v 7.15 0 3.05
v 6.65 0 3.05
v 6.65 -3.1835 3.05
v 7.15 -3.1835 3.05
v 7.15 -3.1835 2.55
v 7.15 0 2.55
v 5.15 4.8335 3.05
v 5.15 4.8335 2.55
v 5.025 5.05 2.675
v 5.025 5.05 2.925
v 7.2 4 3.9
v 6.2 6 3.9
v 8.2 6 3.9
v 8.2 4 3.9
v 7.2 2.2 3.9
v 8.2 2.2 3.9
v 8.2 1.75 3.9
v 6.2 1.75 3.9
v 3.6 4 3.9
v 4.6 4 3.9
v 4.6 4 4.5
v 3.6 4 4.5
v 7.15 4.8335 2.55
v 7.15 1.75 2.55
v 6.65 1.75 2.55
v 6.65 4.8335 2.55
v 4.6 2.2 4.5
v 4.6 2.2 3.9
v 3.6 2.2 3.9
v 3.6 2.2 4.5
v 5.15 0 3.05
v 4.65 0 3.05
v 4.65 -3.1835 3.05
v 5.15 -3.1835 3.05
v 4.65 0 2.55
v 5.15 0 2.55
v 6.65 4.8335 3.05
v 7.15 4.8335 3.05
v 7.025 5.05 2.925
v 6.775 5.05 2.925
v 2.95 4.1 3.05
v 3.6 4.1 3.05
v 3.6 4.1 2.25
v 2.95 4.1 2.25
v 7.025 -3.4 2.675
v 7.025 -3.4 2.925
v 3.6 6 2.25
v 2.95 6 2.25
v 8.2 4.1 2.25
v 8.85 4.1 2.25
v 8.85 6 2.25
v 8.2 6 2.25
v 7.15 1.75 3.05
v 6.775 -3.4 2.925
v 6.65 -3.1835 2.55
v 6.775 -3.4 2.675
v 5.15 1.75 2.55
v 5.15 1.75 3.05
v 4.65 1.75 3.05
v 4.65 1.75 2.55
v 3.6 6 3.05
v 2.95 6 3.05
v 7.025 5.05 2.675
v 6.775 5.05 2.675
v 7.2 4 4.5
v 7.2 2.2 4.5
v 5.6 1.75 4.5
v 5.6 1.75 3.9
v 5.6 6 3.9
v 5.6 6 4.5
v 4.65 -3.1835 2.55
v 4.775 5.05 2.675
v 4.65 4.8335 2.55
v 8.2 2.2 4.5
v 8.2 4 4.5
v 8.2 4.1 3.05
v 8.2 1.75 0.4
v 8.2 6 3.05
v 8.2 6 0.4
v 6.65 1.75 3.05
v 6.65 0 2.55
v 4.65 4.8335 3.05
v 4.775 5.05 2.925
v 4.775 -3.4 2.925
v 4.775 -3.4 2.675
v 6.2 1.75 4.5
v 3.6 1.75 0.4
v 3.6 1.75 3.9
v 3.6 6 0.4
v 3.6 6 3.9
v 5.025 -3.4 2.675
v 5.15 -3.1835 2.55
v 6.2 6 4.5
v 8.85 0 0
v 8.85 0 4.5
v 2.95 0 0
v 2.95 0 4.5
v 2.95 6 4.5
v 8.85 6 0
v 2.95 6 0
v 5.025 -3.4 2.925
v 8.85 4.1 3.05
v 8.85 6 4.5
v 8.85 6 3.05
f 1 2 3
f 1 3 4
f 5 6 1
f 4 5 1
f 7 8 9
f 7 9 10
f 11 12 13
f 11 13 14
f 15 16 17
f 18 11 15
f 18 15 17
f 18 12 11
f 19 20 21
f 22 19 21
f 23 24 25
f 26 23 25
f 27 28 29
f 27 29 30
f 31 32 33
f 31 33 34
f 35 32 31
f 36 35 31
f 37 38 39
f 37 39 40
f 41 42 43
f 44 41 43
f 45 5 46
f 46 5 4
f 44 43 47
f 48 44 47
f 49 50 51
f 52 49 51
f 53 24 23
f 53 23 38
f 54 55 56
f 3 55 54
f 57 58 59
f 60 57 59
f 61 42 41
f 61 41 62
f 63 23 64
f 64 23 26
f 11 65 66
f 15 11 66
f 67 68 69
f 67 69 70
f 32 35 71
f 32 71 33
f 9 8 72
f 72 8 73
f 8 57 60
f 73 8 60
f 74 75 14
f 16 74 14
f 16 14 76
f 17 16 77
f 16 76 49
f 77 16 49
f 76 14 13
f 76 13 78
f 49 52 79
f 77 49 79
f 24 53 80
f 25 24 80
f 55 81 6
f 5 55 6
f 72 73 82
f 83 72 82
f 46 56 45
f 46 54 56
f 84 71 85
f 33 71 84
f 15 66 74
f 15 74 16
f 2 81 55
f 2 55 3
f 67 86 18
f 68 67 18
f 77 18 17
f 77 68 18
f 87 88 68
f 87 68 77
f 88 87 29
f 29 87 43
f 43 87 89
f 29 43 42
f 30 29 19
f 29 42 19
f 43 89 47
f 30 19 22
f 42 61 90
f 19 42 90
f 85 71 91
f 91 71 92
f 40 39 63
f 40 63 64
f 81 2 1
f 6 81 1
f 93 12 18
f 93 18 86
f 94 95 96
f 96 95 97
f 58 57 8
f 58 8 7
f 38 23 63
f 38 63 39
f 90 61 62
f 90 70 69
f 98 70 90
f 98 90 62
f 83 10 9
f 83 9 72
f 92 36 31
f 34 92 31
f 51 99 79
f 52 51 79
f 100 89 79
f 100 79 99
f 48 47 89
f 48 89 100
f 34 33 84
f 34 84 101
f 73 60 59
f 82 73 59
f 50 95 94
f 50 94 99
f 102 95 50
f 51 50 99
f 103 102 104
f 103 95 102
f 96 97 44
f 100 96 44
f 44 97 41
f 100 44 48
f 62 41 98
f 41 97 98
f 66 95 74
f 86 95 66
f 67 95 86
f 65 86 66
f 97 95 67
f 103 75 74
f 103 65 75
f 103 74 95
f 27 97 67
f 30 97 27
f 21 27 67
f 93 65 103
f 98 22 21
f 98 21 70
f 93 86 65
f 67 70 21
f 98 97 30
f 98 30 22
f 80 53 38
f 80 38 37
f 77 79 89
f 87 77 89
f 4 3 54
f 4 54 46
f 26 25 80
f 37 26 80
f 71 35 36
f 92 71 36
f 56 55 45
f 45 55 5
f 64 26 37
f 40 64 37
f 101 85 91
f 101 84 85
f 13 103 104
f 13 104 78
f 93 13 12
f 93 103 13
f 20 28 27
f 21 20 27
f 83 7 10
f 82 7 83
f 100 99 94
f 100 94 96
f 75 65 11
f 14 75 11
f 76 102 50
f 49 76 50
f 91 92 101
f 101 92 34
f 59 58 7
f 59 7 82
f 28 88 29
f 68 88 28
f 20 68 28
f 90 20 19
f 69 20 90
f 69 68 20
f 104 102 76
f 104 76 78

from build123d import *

# Parameters (mm, degrees)
SKETCH1_W            = 6
SKETCH1_H            = 4.1
BOSS_EXTRUDE1_DEPTH  = 2.6
SKETCH2_W            = 2.6
SKETCH2_H            = 3.5
CUT_EXTRUDE1_DEPTH   = 4.25
SKETCH3_W            = 0.6
SKETCH3_H            = 4.25
CUT_EXTRUDE2_DEPTH   = 1.6
SKETCH4_W            = 1
SKETCH4_H            = 0.6
BOSS_EXTRUDE2_DEPTH  = 4.25
BOSS_EXTRUDE3_DEPTH  = 1
SKETCH6_W            = 0.6
SKETCH6_H            = 2
BOSS_EXTRUDE4_DEPTH  = 1
SKETCH7_W            = 4.1
SKETCH7_H            = 6
BOSS_EXTRUDE5_DEPTH  = 0.65
SKETCH8_W            = 0.6
SKETCH8_H            = 2
BOSS_EXTRUDE6_DEPTH  = 1
BOSS_EXTRUDE7_DEPTH  = 1
SKETCH10_W           = 4.1
SKETCH10_H           = 6
BOSS_EXTRUDE8_DEPTH  = 0.65
SKETCH11_W           = 5.9
SKETCH11_H           = 6
BOSS_EXTRUDE9_DEPTH  = 0.4
SKETCH12_W           = 0.8
SKETCH12_H           = 1.9
CUT_EXTRUDE3_DEPTH   = 1.65
SKETCH13_W           = 0.8
SKETCH13_H           = 1.9
CUT_EXTRUDE4_DEPTH   = 6.9
SKETCH14_W           = 0.5
SKETCH14_H           = 0.5
BOSS_EXTRUDE10_DEPTH = 3.3
SKETCH15_W           = 0.5
SKETCH15_H           = 0.5
BOSS_EXTRUDE11_DEPTH = 3.3
SKETCH16_W           = 0.5
SKETCH16_H           = 0.5
BOSS_EXTRUDE12_DEPTH = 3.4
SKETCH17_W           = 0.5
SKETCH17_H           = 0.5
BOSS_EXTRUDE13_DEPTH = 3.4
CHAMFER1_SIZE        = 0.125
CHAMFER1_SIZE2       = 0.216506351
CHAMFER2_SIZE        = 0.125
CHAMFER2_SIZE2       = 0.216506351
CHAMFER3_SIZE        = 0.125
CHAMFER3_SIZE2       = 0.216506351
CHAMFER4_SIZE        = 0.125
CHAMFER4_SIZE2       = 0.216506351


with BuildPart() as part:
    # Sketch1 → Boss-Extrude1 (new body)
    with BuildSketch(Plane(origin=(4.6, 0, 0), x_dir=(0, -1, 0), z_dir=(-1, 0, 0))):
        with Locations((-3, 2.45)):
            Rectangle(SKETCH1_W, SKETCH1_H)
    extrude(amount=-BOSS_EXTRUDE1_DEPTH)

    # Sketch2 → Cut-Extrude1 (cut)
    with BuildSketch(Plane(origin=(0, 6, 0), x_dir=(-1, 0, 0), z_dir=(0, 1, 0))):
        with Locations((-5.9, 2.15)):
            Rectangle(SKETCH2_W, SKETCH2_H)
    extrude(amount=-CUT_EXTRUDE1_DEPTH, mode=Mode.SUBTRACT)

    # Sketch3 → Cut-Extrude2 (cut)
    with BuildSketch(Plane.ZY.offset(-4.6)):
        with Locations((4.2, 3.875)):
            Rectangle(SKETCH3_W, SKETCH3_H)
    extrude(amount=-CUT_EXTRUDE2_DEPTH, mode=Mode.SUBTRACT)

    # Sketch4 → Boss-Extrude2 (add)
    with BuildSketch(Plane(origin=(0, 1.75, 0), x_dir=(-1, 0, 0), z_dir=(0, 1, 0))):
        with Locations((-5.1, 4.2)):
            Rectangle(SKETCH4_W, SKETCH4_H)
    extrude(amount=BOSS_EXTRUDE2_DEPTH)

    # Sketch5 → Boss-Extrude3 (add)
    with BuildSketch(Plane.ZY.offset(-4.6)):
        Polygon((0.4, 0), (0.4, 1.75), (3.9, 1.75), (3.9, 2.2), (4.5, 2.2), (4.5, 0), align=None)
    extrude(amount=BOSS_EXTRUDE3_DEPTH)

    # Sketch6 → Boss-Extrude4 (add)
    with BuildSketch(Plane.ZY.offset(-4.6)):
        with Locations((4.2, 5)):
            Rectangle(SKETCH6_W, SKETCH6_H)
    extrude(amount=BOSS_EXTRUDE4_DEPTH)

    # Sketch7 → Boss-Extrude5 (add)
    with BuildSketch(Plane.ZY.offset(-3.6)):
        with Locations((2.45, 3)):
            Rectangle(SKETCH7_W, SKETCH7_H)
    extrude(amount=BOSS_EXTRUDE5_DEPTH)

    # Sketch8 → Boss-Extrude6 (add)
    with BuildSketch(Plane(origin=(7.2, 0, 0), x_dir=(0, 0, -1), z_dir=(1, 0, 0))):
        with Locations((-4.2, 5)):
            Rectangle(SKETCH8_W, SKETCH8_H)
    extrude(amount=BOSS_EXTRUDE6_DEPTH)

    # Sketch9 → Boss-Extrude7 (add)
    with BuildSketch(Plane(origin=(7.2, 0, 0), x_dir=(0, 0, -1), z_dir=(1, 0, 0))):
        Polygon((-3.9, 1.75), (-0.4, 1.75), (-0.4, 0), (-4.5, 0), (-4.5, 2.2), (-3.9, 2.2), align=None)
    extrude(amount=BOSS_EXTRUDE7_DEPTH)

    # Sketch10 → Boss-Extrude8 (add)
    with BuildSketch(Plane(origin=(8.2, 0, 0), x_dir=(0, 0, -1), z_dir=(1, 0, 0))):
        with Locations((-2.45, 3)):
            Rectangle(SKETCH10_W, SKETCH10_H)
    extrude(amount=BOSS_EXTRUDE8_DEPTH)

    # Sketch11 → Boss-Extrude9 (add)
    with BuildSketch(Plane(origin=(0, 0, 0.4), x_dir=(-1, 0, 0), z_dir=(0, 0, -1))):
        with Locations((-5.9, 3)):
            Rectangle(SKETCH11_W, SKETCH11_H)
    extrude(amount=BOSS_EXTRUDE9_DEPTH)

    # Sketch12 → Cut-Extrude3 (cut, through all)
    with BuildSketch(Plane(origin=(3.6, 0, 0), x_dir=(0, 0, -1), z_dir=(1, 0, 0))):
        with Locations((-2.65, 5.05)):
            Rectangle(SKETCH12_W, SKETCH12_H)
    extrude(amount=-CUT_EXTRUDE3_DEPTH, mode=Mode.SUBTRACT)

    # Sketch13 → Cut-Extrude4 (cut, through all)
    with BuildSketch(Plane(origin=(8.85, 0, 0), x_dir=(0, 0, -1), z_dir=(1, 0, 0))):
        with Locations((-2.65, 5.05)):
            Rectangle(SKETCH13_W, SKETCH13_H)
    extrude(amount=-CUT_EXTRUDE4_DEPTH, mode=Mode.SUBTRACT)


with BuildPart() as body_2:
    # Sketch14 → Boss-Extrude10 (new body)
    with BuildSketch(Plane(origin=(0, 1.75, 0), x_dir=(-1, 0, 0), z_dir=(0, 1, 0))):
        with Locations((-4.9, 2.8)):
            Rectangle(SKETCH14_W, SKETCH14_H)
    extrude(amount=BOSS_EXTRUDE10_DEPTH)

    # Chamfer1
    chamfer1_edges = [body_2.edges().sort_by_distance(p)[0] for p in [
        (5.15, 5.05, 2.8),
        (4.9, 5.05, 2.55),
        (4.65, 5.05, 2.8),
        (4.9, 5.05, 3.05),
    ]]
    chamfer1_side = [body_2.faces().sort_by_distance(p)[0] for p in [
        (4.9, 5.05, 2.8),
    ]]
    chamfer(chamfer1_edges, length=CHAMFER1_SIZE, length2=CHAMFER1_SIZE2, reference=chamfer1_side[0])


with BuildPart() as body_3:
    # Sketch15 → Boss-Extrude11 (new body)
    with BuildSketch(Plane(origin=(0, 1.75, 0), x_dir=(-1, 0, 0), z_dir=(0, 1, 0))):
        with Locations((-6.9, 2.8)):
            Rectangle(SKETCH15_W, SKETCH15_H)
    extrude(amount=BOSS_EXTRUDE11_DEPTH)

    # Chamfer2
    chamfer2_edges = [body_3.edges().sort_by_distance(p)[0] for p in [
        (7.15, 5.05, 2.8),
        (6.9, 5.05, 2.55),
        (6.65, 5.05, 2.8),
        (6.9, 5.05, 3.05),
    ]]
    chamfer2_side = [body_3.faces().sort_by_distance(p)[0] for p in [
        (6.9, 5.05, 2.8),
    ]]
    chamfer(chamfer2_edges, length=CHAMFER2_SIZE, length2=CHAMFER2_SIZE2, reference=chamfer2_side[0])


with BuildPart() as body_4:
    # Sketch16 → Boss-Extrude12 (new body)
    with BuildSketch(Plane.XZ):
        with Locations((4.9, 2.8)):
            Rectangle(SKETCH16_W, SKETCH16_H)
    extrude(amount=BOSS_EXTRUDE12_DEPTH)

    # Chamfer4
    chamfer4_edges = [body_4.edges().sort_by_distance(p)[0] for p in [
        (4.9, -3.4, 2.55),
        (5.15, -3.4, 2.8),
        (4.9, -3.4, 3.05),
        (4.65, -3.4, 2.8),
    ]]
    chamfer4_side = [body_4.faces().sort_by_distance(p)[0] for p in [
        (4.9, -3.4, 2.8),
    ]]
    chamfer(chamfer4_edges, length=CHAMFER4_SIZE, length2=CHAMFER4_SIZE2, reference=chamfer4_side[0])


with BuildPart() as body_5:
    # Sketch17 → Boss-Extrude13 (new body)
    with BuildSketch(Plane.XZ):
        with Locations((6.9, 2.8)):
            Rectangle(SKETCH17_W, SKETCH17_H)
    extrude(amount=BOSS_EXTRUDE13_DEPTH)

    # Chamfer3
    chamfer3_edges = [body_5.edges().sort_by_distance(p)[0] for p in [
        (6.9, -3.4, 2.55),
        (7.15, -3.4, 2.8),
        (6.9, -3.4, 3.05),
        (6.65, -3.4, 2.8),
    ]]
    chamfer3_side = [body_5.faces().sort_by_distance(p)[0] for p in [
        (6.9, -3.4, 2.8),
    ]]
    chamfer(chamfer3_edges, length=CHAMFER3_SIZE, length2=CHAMFER3_SIZE2, reference=chamfer3_side[0])


solid = Compound([part.part, body_2.part, body_3.part, body_4.part, body_5.part])
